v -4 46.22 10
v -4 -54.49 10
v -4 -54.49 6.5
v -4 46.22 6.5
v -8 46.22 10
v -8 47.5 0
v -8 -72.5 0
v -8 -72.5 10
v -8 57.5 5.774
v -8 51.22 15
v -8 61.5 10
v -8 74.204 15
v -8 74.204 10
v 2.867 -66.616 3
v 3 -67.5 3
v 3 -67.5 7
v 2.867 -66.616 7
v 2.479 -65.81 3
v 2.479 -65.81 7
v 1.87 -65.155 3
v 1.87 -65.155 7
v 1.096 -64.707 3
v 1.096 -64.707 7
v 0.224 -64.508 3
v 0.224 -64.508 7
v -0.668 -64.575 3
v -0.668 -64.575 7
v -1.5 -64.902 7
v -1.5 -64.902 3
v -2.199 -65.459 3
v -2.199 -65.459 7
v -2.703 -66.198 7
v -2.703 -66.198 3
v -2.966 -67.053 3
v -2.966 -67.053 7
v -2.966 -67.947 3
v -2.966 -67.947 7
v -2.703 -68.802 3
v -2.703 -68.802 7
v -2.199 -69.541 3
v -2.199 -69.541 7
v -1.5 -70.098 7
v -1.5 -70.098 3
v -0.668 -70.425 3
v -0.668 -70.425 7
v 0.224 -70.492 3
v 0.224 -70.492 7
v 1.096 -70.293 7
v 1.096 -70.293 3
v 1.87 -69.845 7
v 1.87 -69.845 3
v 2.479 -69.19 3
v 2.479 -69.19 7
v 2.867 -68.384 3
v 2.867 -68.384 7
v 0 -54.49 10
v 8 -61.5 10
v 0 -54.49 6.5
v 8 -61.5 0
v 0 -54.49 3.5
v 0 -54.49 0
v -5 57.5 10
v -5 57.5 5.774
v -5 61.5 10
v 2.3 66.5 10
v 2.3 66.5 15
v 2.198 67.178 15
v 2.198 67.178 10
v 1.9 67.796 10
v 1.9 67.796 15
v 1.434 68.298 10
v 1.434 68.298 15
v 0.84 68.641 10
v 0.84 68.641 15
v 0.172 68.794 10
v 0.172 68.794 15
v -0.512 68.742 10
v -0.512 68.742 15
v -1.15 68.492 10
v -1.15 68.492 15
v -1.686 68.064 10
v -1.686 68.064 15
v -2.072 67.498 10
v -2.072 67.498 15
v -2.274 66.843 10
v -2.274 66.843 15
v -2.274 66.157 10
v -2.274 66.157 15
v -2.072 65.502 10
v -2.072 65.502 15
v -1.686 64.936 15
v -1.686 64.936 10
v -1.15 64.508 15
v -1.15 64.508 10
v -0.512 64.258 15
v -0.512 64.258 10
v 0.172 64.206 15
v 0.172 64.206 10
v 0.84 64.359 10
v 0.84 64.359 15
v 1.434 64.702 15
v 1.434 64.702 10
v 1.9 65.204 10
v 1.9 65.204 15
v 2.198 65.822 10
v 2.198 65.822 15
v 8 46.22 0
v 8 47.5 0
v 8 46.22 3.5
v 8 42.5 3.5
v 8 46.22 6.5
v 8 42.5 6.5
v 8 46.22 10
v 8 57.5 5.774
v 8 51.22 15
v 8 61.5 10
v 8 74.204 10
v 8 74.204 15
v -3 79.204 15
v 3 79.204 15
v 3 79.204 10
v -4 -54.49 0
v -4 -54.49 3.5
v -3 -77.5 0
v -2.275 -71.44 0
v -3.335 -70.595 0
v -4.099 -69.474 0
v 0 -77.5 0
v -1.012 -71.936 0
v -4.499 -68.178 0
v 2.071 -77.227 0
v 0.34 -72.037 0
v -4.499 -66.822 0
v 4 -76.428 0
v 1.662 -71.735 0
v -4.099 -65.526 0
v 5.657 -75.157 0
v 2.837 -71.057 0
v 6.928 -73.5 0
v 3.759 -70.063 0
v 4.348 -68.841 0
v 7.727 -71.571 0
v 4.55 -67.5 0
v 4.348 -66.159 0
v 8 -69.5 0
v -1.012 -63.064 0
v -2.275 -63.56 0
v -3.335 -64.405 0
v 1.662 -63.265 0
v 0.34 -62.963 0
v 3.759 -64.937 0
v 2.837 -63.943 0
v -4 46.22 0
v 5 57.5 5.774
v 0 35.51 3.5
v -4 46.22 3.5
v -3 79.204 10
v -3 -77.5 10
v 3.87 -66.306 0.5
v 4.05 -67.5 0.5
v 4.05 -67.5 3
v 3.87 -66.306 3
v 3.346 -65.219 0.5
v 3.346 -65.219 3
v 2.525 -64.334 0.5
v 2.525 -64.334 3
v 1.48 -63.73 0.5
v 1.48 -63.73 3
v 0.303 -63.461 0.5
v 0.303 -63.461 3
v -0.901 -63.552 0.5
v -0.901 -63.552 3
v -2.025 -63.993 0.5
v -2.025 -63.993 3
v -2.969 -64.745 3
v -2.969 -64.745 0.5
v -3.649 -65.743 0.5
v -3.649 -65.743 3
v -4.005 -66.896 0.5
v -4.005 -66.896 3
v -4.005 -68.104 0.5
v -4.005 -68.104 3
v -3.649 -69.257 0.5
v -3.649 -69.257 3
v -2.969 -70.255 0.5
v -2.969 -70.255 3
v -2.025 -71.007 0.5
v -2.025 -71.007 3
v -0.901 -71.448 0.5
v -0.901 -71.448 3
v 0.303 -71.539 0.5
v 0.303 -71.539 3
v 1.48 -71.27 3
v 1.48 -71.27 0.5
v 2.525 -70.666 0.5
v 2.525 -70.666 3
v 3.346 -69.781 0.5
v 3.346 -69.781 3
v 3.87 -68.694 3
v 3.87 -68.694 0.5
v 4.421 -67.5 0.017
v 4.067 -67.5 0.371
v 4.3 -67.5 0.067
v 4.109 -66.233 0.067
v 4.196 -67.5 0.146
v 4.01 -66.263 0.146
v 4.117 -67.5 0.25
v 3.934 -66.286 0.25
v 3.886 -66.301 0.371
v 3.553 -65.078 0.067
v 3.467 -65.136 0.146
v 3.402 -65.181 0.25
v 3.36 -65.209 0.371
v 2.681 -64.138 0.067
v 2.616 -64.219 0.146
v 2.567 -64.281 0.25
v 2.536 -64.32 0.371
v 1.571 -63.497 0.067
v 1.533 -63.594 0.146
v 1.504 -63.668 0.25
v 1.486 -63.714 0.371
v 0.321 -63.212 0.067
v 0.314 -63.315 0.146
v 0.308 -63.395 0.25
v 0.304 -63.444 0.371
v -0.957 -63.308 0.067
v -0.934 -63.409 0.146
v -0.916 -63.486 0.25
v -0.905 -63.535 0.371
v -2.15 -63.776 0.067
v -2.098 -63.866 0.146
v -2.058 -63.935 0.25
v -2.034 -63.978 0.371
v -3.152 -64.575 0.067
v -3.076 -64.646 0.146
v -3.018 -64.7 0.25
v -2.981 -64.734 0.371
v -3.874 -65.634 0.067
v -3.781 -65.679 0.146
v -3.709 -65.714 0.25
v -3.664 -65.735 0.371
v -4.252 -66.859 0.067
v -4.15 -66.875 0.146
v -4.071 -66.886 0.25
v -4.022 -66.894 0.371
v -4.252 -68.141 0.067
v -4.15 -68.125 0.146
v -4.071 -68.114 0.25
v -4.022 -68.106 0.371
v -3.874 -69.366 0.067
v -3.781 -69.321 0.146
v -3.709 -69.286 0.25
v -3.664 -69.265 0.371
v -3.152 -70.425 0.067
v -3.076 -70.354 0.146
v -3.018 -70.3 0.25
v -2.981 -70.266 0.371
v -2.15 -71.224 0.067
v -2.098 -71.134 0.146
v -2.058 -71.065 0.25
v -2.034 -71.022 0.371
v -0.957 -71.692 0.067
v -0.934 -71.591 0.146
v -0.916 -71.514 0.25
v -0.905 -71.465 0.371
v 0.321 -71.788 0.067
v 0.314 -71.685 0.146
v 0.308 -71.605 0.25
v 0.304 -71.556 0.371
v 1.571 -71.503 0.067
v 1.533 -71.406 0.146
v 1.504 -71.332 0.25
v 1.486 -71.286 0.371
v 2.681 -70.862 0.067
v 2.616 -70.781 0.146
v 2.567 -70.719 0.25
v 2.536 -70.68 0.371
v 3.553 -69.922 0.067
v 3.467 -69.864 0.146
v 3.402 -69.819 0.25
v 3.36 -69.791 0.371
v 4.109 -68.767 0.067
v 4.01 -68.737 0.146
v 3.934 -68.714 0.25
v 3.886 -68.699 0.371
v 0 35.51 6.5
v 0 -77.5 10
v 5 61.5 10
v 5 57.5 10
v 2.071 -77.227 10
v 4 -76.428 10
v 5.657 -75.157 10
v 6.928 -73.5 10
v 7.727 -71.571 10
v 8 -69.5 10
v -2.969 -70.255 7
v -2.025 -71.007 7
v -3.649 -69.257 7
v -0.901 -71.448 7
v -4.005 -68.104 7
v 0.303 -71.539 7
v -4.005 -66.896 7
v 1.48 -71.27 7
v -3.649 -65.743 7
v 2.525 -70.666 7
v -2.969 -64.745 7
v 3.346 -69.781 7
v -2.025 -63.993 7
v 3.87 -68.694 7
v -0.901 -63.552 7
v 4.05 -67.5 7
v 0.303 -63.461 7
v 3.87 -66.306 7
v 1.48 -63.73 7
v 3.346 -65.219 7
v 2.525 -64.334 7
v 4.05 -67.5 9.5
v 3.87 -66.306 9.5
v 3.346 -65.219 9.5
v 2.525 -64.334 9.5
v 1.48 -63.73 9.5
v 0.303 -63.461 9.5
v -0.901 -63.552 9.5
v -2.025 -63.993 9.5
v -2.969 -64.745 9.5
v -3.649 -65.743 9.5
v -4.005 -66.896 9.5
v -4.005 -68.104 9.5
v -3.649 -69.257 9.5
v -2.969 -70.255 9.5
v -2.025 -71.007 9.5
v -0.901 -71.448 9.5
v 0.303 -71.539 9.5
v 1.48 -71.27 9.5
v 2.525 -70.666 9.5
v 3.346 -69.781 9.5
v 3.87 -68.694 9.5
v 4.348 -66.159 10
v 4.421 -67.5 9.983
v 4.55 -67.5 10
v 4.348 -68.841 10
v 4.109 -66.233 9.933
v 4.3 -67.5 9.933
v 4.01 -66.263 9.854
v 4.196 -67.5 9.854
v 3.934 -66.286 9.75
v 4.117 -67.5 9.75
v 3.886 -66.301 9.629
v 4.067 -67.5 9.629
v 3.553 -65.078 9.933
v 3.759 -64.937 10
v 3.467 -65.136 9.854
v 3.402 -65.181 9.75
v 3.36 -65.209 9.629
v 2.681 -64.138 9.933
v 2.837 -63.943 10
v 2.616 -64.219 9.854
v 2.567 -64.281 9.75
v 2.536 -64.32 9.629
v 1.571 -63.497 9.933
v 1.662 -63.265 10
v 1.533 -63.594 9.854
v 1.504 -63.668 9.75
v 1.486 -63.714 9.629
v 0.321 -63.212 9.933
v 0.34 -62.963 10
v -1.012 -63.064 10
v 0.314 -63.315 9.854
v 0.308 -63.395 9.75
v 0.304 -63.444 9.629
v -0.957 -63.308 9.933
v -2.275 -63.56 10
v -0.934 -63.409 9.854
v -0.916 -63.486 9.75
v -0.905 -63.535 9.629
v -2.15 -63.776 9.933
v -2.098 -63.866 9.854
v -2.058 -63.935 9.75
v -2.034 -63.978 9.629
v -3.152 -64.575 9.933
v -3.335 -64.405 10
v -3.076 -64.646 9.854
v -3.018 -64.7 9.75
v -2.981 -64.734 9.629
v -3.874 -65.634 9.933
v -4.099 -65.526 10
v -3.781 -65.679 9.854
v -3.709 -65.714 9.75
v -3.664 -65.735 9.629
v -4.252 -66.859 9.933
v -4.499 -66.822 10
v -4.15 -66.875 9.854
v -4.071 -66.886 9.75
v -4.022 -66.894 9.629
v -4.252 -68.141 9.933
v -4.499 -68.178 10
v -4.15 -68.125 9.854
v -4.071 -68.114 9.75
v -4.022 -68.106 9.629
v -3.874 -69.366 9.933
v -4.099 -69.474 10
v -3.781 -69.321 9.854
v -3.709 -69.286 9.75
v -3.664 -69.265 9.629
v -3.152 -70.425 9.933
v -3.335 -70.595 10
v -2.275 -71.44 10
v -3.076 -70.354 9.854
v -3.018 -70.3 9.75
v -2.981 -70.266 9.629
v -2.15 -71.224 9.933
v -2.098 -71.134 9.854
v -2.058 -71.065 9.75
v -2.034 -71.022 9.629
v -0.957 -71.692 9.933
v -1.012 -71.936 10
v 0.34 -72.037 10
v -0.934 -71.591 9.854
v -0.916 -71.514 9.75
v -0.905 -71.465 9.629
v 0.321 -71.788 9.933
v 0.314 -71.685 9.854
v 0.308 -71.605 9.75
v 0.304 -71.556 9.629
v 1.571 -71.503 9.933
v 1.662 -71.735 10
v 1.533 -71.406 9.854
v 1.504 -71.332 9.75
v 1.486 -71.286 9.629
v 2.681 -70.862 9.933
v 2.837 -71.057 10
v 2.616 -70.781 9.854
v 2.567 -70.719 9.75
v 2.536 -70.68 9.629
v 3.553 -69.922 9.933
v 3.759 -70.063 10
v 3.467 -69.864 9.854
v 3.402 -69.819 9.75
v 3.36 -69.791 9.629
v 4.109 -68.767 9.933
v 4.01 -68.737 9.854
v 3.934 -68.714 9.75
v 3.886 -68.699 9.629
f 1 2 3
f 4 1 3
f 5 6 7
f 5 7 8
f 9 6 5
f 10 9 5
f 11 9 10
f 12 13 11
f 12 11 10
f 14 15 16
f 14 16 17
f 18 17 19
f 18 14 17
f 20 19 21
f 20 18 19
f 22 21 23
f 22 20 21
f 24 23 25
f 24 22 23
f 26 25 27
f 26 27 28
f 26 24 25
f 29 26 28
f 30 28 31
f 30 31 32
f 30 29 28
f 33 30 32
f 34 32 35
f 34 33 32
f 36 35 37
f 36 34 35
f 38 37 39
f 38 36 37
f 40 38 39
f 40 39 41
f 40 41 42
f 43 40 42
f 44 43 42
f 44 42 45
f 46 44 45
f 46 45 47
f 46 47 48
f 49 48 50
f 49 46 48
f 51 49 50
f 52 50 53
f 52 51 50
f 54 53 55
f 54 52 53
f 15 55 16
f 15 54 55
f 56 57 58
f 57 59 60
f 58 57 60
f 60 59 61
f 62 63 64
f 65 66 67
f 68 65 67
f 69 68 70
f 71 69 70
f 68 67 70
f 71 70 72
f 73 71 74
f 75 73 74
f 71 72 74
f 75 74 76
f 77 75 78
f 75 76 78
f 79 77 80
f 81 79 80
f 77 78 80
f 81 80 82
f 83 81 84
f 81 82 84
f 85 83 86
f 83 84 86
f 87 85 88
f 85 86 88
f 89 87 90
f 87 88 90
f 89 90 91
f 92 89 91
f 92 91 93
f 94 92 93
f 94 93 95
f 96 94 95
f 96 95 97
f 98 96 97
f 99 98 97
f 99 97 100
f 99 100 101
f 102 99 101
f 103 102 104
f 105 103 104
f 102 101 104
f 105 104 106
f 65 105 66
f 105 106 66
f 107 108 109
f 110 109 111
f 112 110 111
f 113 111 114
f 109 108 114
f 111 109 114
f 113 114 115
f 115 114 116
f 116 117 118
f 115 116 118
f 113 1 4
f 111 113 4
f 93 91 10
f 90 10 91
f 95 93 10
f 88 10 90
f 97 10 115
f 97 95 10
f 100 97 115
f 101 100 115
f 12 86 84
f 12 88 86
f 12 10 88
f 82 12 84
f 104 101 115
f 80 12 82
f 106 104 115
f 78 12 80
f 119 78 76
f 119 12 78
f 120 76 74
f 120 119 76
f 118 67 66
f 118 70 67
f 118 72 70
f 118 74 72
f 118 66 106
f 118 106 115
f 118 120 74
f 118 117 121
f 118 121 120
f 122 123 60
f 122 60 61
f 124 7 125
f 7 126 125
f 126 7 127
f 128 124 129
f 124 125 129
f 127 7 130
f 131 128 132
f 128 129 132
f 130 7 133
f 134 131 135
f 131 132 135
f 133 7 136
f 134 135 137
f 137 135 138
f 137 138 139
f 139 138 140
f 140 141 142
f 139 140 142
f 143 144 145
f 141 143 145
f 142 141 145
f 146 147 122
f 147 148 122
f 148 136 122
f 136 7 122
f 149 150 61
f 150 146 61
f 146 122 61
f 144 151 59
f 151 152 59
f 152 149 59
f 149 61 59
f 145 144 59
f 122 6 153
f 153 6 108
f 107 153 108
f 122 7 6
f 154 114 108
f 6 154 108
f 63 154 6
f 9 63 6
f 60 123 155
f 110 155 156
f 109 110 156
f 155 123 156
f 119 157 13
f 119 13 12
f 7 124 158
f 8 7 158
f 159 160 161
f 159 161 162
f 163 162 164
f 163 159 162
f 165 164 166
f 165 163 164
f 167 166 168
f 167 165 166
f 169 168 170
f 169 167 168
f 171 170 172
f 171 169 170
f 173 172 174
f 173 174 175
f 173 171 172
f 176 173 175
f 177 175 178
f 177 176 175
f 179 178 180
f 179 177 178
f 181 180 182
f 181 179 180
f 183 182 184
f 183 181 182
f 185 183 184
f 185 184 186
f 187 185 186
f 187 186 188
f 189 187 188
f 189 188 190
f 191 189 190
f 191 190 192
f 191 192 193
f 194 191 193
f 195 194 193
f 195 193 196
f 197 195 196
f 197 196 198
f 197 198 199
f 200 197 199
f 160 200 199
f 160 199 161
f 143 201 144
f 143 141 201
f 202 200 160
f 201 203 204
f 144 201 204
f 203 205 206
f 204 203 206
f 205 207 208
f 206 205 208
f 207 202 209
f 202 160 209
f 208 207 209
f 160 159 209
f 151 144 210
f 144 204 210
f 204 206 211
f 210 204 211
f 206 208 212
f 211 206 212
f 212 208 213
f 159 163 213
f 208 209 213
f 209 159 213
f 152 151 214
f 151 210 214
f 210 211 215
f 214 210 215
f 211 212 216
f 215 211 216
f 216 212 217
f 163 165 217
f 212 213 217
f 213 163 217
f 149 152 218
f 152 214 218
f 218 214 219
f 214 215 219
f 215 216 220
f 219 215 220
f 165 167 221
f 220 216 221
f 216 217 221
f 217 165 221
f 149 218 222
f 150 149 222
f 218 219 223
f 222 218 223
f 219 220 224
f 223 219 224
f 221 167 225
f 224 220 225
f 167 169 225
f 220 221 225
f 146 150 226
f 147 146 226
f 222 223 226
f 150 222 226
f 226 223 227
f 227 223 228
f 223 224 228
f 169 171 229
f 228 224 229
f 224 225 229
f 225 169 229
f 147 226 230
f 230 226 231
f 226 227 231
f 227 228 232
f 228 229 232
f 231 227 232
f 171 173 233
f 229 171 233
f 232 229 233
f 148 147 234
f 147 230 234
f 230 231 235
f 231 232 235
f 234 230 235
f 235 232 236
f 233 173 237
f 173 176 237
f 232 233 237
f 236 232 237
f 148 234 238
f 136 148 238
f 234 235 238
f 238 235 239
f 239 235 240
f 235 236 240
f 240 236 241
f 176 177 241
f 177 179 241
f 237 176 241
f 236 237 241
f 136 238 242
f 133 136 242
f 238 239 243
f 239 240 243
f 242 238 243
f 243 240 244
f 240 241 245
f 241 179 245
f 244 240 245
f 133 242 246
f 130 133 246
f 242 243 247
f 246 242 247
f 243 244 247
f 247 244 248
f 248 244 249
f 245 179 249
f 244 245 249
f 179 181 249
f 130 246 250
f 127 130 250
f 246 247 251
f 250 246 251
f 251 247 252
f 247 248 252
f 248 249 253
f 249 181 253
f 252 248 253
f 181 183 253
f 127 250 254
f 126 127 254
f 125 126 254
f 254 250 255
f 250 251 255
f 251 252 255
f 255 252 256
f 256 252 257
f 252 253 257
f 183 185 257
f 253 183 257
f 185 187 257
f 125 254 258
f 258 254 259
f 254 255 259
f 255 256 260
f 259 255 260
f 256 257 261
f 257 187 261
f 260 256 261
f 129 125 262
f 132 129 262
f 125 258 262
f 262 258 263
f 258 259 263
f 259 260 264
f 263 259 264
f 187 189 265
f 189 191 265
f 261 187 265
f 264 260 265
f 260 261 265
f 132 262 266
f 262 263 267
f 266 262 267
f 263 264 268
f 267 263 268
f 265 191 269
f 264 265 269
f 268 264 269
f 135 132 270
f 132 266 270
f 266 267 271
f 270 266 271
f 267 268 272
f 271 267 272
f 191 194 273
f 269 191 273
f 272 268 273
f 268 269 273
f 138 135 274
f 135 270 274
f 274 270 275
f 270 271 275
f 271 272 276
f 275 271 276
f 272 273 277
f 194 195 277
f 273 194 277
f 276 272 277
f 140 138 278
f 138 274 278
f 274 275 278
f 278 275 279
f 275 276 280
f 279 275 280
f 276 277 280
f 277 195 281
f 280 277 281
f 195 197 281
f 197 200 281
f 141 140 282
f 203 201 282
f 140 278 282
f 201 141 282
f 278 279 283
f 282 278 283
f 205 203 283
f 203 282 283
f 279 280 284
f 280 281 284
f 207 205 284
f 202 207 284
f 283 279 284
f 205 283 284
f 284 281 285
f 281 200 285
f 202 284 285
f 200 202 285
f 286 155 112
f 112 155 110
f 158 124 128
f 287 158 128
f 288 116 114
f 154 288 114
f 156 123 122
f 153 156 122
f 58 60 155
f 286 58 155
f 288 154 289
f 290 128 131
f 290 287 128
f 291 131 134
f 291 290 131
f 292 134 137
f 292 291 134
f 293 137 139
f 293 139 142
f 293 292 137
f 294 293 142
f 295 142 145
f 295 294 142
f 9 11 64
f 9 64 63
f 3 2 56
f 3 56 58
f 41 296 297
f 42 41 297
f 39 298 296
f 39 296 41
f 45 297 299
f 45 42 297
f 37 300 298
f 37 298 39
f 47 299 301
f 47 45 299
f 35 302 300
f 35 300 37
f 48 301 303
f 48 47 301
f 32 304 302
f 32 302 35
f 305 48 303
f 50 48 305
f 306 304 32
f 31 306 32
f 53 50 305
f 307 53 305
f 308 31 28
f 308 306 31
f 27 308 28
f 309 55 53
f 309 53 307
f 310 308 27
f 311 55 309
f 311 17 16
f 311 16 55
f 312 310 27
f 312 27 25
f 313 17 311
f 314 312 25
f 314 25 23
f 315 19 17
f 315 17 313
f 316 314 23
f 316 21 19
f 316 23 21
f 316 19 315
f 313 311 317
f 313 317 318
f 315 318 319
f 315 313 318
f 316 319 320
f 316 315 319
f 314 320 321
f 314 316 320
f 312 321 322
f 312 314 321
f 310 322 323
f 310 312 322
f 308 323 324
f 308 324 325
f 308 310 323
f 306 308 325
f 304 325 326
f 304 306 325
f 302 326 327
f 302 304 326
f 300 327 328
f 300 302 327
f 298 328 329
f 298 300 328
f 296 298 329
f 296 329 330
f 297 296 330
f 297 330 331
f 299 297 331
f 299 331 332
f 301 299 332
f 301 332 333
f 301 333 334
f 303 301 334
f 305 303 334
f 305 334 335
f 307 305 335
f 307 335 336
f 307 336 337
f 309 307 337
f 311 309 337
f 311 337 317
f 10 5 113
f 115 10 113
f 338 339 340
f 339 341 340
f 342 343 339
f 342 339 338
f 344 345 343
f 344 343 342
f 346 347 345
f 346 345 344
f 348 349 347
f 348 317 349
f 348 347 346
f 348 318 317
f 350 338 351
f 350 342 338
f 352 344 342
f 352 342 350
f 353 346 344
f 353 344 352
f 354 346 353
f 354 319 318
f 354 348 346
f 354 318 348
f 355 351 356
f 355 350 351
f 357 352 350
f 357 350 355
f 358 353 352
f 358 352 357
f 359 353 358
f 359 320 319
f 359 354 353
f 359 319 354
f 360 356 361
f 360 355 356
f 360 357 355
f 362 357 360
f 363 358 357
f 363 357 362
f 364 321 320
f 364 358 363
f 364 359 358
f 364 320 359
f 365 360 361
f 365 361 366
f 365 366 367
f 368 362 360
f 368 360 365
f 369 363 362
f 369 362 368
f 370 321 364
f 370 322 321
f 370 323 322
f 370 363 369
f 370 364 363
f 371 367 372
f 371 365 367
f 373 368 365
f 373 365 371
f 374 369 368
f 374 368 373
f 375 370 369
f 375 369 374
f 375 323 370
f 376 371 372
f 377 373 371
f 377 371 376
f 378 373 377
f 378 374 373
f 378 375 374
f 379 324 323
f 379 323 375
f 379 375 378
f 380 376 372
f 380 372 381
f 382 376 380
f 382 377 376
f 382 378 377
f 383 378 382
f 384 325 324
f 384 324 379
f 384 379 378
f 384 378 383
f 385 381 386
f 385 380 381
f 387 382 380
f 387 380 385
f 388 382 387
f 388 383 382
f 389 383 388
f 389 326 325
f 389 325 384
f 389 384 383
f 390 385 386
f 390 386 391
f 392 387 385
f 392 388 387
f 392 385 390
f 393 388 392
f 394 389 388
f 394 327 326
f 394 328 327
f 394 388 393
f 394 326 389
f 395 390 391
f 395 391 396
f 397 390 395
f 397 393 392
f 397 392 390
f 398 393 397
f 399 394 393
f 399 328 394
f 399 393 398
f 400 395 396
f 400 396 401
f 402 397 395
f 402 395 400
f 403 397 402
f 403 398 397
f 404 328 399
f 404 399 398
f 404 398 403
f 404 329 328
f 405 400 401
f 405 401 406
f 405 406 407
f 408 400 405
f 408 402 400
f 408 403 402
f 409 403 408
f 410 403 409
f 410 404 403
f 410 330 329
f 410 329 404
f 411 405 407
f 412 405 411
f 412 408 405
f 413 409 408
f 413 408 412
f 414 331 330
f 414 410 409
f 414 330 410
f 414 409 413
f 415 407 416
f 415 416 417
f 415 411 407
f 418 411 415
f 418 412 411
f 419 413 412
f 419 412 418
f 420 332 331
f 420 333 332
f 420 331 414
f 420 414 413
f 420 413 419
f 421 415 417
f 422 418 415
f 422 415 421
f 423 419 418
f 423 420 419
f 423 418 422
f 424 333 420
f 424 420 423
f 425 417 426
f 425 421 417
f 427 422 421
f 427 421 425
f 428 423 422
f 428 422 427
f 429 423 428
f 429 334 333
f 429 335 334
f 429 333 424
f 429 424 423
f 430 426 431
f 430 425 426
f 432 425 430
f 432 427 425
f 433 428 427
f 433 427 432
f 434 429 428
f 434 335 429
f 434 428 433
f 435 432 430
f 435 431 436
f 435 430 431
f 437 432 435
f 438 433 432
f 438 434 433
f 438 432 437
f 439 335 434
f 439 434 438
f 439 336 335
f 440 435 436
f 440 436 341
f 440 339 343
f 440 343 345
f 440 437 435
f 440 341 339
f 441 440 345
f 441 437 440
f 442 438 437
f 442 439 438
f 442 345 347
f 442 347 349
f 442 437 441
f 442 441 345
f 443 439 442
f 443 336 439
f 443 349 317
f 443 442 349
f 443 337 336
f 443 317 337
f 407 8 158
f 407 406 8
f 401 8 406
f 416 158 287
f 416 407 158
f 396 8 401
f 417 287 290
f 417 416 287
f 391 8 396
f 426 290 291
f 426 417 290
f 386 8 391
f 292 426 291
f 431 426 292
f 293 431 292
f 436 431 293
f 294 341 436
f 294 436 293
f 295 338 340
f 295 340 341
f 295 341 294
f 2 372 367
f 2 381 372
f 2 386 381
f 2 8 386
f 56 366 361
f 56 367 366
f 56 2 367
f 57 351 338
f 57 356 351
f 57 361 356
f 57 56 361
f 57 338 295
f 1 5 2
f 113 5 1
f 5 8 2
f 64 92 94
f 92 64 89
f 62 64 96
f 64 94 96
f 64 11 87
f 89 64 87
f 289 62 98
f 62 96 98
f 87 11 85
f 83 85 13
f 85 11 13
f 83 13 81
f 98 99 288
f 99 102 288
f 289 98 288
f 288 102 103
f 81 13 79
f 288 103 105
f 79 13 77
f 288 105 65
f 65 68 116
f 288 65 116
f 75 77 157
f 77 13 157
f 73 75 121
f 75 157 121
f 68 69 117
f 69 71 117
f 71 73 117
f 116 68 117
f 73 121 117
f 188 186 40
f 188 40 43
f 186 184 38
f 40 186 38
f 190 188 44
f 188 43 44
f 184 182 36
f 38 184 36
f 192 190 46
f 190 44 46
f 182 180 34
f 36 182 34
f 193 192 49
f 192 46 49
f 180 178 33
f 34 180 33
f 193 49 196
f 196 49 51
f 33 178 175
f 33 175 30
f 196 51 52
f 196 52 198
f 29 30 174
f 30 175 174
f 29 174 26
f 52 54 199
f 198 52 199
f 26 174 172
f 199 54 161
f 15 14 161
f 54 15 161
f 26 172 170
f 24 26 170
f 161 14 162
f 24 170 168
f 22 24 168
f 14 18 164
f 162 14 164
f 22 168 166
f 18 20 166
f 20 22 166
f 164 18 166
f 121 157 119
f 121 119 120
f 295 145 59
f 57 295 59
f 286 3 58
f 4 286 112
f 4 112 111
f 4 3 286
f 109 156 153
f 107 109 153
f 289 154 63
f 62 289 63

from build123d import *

# Parameters (mm, degrees)
SKETCH_1_R               = 4.05
EXTRUDE_1_DEPTH          = 10
SKETCH_2_W               = 16
SKETCH_2_H               = 27.984210489
EXTRUDE_2_DEPTH          = 5
SKETCH_3_R               = 2.3
CUT_EXTRUDE_1_DEPTH      = 5
CHAMFER_2_SIZE           = 5
CHAMFER_3_SIZE           = 10
CHAMFER_3_SIZE2          = 5.773502692
EXTRUDE_3_DEPTH          = 3
CHAMFER_5_SIZE           = 5
CHAMFER_6_SIZE           = 5
FILLET_1_R               = 8
CUT_EXTRUDE_3_DEPTH      = 20
CUT_EXTRUDE_3_DEPTH_BACK = 4
SKETCH_7_W               = 3.5
SKETCH_7_H               = 100.709566722
EXTRUDE_4_DEPTH          = 2
EXTRUDE_4_DEPTH_BACK     = 2
SKETCH_8_R               = 4.05
SKETCH_8_R_2             = 3
FILLET_2_R               = 0.5


with BuildPart() as part:
    # 草图1 → 凸台-拉伸1 (new body)
    with BuildSketch(Plane.XY):
        Polygon((-8, -77.5), (8, -77.5), (8, -61.5), (0, -54.489879842), (0, 35.510120158), (8, 42.5), (8, 57.5), (-8, 57.5), (-8, 42.5), (-8, -61.5), align=None)
        with Locations((0, -67.5)):
            Circle(SKETCH_1_R, mode=Mode.SUBTRACT)
    extrude(amount=EXTRUDE_1_DEPTH)

    # 草图2 → 凸台-拉伸2 (add)
    with BuildSketch(Plane.XY.offset(10)):
        with Locations((0, 65.211792125)):
            Rectangle(SKETCH_2_W, SKETCH_2_H)
    extrude(amount=EXTRUDE_2_DEPTH)

    # 草图3 → 切除-拉伸1 (cut)
    with BuildSketch(Plane.XY.offset(15)):
        with Locations((0, 66.5)):
            Circle(SKETCH_3_R)
    extrude(amount=-CUT_EXTRUDE_1_DEPTH, mode=Mode.SUBTRACT)

    # 倒角2
    chamfer_2_edges = [part.edges().sort_by_distance(p)[0] for p in [
        (0, 51.21968688, 10),
    ]]
    chamfer(chamfer_2_edges, length=CHAMFER_2_SIZE - 0.0001)  # a hair under: the kernel refuses the full size

    # 倒角3
    chamfer_3_edges = [part.edges().sort_by_distance(p)[0] for p in [
        (0, 57.5, 0),
    ]]
    chamfer_3_side = [part.faces().sort_by_distance(p)[0] for p in [
        (-2.385544593, -8.070394636, 0),
    ]]
    chamfer(chamfer_3_edges, length=CHAMFER_3_SIZE, length2=CHAMFER_3_SIZE2, reference=chamfer_3_side[0])

    # 草图5 → 凸台-拉伸3 (add)
    with BuildSketch(Plane(origin=(8, 0, 0), x_dir=(0, 0, -1), z_dir=(1, 0, 0))):
        Polygon((-10, 61.5), (-5.773502692, 57.5), (-10, 57.5), align=None)
    extrude_3 = extrude(amount=-EXTRUDE_3_DEPTH)

    # 镜向1: 凸台-拉伸3 across plane
    add(extrude_3.mirror(Plane(origin=(0, 0, 0), x_dir=(0, 0, 1), z_dir=(1, 0, 0))))

    # 倒角5
    chamfer_5_edges = [part.edges().sort_by_distance(p)[0] for p in [
        (-8, 79.203897369, 12.5),
        (8, 79.203897369, 12.5),
    ]]
    chamfer(chamfer_5_edges, length=CHAMFER_5_SIZE)

    # 倒角6
    chamfer_6_edges = [part.edges().sort_by_distance(p)[0] for p in [
        (-8, -77.5, 5),
    ]]
    chamfer(chamfer_6_edges, length=CHAMFER_6_SIZE)

    # 圆角1
    fillet_1_edges = [part.edges().sort_by_distance(p)[0] for p in [
        (8, -77.5, 5),
    ]]
    fillet(fillet_1_edges, radius=FILLET_1_R)

    # 草图7 → 切除-拉伸3 (cut, two sides: drawn at the far end of the back side and taken through both)
    with BuildSketch(Plane(origin=(0, 0, 0), x_dir=(0, 0, -1), z_dir=(1, 0, 0)).offset(-CUT_EXTRUDE_3_DEPTH_BACK)):
        with Locations((-1.75, -4.135096481)):
            Rectangle(SKETCH_7_W, SKETCH_7_H)
        with Locations((-8.25, -4.135096481)):
            Rectangle(SKETCH_7_W, SKETCH_7_H)
    extrude(amount=CUT_EXTRUDE_3_DEPTH + CUT_EXTRUDE_3_DEPTH_BACK, mode=Mode.SUBTRACT)

    # 草图8 → 凸台-拉伸4 (add, two sides: drawn at the far end of the back side and taken through both)
    with BuildSketch(Plane.XY.offset(5).offset(-EXTRUDE_4_DEPTH_BACK)):
        with Locations((0, -67.5)):
            Circle(SKETCH_8_R)
        with Locations((0, -67.5)):
            Circle(SKETCH_8_R_2, mode=Mode.SUBTRACT)
    extrude(amount=EXTRUDE_4_DEPTH + EXTRUDE_4_DEPTH_BACK)

    # 圆角2
    fillet_2_edges = [part.edges().sort_by_distance(p)[0] for p in [
        (-4.05, -67.5, 0),
        (-4.05, -67.5, 10),
    ]]
    fillet(fillet_2_edges, radius=FILLET_2_R)


solid = part.part
